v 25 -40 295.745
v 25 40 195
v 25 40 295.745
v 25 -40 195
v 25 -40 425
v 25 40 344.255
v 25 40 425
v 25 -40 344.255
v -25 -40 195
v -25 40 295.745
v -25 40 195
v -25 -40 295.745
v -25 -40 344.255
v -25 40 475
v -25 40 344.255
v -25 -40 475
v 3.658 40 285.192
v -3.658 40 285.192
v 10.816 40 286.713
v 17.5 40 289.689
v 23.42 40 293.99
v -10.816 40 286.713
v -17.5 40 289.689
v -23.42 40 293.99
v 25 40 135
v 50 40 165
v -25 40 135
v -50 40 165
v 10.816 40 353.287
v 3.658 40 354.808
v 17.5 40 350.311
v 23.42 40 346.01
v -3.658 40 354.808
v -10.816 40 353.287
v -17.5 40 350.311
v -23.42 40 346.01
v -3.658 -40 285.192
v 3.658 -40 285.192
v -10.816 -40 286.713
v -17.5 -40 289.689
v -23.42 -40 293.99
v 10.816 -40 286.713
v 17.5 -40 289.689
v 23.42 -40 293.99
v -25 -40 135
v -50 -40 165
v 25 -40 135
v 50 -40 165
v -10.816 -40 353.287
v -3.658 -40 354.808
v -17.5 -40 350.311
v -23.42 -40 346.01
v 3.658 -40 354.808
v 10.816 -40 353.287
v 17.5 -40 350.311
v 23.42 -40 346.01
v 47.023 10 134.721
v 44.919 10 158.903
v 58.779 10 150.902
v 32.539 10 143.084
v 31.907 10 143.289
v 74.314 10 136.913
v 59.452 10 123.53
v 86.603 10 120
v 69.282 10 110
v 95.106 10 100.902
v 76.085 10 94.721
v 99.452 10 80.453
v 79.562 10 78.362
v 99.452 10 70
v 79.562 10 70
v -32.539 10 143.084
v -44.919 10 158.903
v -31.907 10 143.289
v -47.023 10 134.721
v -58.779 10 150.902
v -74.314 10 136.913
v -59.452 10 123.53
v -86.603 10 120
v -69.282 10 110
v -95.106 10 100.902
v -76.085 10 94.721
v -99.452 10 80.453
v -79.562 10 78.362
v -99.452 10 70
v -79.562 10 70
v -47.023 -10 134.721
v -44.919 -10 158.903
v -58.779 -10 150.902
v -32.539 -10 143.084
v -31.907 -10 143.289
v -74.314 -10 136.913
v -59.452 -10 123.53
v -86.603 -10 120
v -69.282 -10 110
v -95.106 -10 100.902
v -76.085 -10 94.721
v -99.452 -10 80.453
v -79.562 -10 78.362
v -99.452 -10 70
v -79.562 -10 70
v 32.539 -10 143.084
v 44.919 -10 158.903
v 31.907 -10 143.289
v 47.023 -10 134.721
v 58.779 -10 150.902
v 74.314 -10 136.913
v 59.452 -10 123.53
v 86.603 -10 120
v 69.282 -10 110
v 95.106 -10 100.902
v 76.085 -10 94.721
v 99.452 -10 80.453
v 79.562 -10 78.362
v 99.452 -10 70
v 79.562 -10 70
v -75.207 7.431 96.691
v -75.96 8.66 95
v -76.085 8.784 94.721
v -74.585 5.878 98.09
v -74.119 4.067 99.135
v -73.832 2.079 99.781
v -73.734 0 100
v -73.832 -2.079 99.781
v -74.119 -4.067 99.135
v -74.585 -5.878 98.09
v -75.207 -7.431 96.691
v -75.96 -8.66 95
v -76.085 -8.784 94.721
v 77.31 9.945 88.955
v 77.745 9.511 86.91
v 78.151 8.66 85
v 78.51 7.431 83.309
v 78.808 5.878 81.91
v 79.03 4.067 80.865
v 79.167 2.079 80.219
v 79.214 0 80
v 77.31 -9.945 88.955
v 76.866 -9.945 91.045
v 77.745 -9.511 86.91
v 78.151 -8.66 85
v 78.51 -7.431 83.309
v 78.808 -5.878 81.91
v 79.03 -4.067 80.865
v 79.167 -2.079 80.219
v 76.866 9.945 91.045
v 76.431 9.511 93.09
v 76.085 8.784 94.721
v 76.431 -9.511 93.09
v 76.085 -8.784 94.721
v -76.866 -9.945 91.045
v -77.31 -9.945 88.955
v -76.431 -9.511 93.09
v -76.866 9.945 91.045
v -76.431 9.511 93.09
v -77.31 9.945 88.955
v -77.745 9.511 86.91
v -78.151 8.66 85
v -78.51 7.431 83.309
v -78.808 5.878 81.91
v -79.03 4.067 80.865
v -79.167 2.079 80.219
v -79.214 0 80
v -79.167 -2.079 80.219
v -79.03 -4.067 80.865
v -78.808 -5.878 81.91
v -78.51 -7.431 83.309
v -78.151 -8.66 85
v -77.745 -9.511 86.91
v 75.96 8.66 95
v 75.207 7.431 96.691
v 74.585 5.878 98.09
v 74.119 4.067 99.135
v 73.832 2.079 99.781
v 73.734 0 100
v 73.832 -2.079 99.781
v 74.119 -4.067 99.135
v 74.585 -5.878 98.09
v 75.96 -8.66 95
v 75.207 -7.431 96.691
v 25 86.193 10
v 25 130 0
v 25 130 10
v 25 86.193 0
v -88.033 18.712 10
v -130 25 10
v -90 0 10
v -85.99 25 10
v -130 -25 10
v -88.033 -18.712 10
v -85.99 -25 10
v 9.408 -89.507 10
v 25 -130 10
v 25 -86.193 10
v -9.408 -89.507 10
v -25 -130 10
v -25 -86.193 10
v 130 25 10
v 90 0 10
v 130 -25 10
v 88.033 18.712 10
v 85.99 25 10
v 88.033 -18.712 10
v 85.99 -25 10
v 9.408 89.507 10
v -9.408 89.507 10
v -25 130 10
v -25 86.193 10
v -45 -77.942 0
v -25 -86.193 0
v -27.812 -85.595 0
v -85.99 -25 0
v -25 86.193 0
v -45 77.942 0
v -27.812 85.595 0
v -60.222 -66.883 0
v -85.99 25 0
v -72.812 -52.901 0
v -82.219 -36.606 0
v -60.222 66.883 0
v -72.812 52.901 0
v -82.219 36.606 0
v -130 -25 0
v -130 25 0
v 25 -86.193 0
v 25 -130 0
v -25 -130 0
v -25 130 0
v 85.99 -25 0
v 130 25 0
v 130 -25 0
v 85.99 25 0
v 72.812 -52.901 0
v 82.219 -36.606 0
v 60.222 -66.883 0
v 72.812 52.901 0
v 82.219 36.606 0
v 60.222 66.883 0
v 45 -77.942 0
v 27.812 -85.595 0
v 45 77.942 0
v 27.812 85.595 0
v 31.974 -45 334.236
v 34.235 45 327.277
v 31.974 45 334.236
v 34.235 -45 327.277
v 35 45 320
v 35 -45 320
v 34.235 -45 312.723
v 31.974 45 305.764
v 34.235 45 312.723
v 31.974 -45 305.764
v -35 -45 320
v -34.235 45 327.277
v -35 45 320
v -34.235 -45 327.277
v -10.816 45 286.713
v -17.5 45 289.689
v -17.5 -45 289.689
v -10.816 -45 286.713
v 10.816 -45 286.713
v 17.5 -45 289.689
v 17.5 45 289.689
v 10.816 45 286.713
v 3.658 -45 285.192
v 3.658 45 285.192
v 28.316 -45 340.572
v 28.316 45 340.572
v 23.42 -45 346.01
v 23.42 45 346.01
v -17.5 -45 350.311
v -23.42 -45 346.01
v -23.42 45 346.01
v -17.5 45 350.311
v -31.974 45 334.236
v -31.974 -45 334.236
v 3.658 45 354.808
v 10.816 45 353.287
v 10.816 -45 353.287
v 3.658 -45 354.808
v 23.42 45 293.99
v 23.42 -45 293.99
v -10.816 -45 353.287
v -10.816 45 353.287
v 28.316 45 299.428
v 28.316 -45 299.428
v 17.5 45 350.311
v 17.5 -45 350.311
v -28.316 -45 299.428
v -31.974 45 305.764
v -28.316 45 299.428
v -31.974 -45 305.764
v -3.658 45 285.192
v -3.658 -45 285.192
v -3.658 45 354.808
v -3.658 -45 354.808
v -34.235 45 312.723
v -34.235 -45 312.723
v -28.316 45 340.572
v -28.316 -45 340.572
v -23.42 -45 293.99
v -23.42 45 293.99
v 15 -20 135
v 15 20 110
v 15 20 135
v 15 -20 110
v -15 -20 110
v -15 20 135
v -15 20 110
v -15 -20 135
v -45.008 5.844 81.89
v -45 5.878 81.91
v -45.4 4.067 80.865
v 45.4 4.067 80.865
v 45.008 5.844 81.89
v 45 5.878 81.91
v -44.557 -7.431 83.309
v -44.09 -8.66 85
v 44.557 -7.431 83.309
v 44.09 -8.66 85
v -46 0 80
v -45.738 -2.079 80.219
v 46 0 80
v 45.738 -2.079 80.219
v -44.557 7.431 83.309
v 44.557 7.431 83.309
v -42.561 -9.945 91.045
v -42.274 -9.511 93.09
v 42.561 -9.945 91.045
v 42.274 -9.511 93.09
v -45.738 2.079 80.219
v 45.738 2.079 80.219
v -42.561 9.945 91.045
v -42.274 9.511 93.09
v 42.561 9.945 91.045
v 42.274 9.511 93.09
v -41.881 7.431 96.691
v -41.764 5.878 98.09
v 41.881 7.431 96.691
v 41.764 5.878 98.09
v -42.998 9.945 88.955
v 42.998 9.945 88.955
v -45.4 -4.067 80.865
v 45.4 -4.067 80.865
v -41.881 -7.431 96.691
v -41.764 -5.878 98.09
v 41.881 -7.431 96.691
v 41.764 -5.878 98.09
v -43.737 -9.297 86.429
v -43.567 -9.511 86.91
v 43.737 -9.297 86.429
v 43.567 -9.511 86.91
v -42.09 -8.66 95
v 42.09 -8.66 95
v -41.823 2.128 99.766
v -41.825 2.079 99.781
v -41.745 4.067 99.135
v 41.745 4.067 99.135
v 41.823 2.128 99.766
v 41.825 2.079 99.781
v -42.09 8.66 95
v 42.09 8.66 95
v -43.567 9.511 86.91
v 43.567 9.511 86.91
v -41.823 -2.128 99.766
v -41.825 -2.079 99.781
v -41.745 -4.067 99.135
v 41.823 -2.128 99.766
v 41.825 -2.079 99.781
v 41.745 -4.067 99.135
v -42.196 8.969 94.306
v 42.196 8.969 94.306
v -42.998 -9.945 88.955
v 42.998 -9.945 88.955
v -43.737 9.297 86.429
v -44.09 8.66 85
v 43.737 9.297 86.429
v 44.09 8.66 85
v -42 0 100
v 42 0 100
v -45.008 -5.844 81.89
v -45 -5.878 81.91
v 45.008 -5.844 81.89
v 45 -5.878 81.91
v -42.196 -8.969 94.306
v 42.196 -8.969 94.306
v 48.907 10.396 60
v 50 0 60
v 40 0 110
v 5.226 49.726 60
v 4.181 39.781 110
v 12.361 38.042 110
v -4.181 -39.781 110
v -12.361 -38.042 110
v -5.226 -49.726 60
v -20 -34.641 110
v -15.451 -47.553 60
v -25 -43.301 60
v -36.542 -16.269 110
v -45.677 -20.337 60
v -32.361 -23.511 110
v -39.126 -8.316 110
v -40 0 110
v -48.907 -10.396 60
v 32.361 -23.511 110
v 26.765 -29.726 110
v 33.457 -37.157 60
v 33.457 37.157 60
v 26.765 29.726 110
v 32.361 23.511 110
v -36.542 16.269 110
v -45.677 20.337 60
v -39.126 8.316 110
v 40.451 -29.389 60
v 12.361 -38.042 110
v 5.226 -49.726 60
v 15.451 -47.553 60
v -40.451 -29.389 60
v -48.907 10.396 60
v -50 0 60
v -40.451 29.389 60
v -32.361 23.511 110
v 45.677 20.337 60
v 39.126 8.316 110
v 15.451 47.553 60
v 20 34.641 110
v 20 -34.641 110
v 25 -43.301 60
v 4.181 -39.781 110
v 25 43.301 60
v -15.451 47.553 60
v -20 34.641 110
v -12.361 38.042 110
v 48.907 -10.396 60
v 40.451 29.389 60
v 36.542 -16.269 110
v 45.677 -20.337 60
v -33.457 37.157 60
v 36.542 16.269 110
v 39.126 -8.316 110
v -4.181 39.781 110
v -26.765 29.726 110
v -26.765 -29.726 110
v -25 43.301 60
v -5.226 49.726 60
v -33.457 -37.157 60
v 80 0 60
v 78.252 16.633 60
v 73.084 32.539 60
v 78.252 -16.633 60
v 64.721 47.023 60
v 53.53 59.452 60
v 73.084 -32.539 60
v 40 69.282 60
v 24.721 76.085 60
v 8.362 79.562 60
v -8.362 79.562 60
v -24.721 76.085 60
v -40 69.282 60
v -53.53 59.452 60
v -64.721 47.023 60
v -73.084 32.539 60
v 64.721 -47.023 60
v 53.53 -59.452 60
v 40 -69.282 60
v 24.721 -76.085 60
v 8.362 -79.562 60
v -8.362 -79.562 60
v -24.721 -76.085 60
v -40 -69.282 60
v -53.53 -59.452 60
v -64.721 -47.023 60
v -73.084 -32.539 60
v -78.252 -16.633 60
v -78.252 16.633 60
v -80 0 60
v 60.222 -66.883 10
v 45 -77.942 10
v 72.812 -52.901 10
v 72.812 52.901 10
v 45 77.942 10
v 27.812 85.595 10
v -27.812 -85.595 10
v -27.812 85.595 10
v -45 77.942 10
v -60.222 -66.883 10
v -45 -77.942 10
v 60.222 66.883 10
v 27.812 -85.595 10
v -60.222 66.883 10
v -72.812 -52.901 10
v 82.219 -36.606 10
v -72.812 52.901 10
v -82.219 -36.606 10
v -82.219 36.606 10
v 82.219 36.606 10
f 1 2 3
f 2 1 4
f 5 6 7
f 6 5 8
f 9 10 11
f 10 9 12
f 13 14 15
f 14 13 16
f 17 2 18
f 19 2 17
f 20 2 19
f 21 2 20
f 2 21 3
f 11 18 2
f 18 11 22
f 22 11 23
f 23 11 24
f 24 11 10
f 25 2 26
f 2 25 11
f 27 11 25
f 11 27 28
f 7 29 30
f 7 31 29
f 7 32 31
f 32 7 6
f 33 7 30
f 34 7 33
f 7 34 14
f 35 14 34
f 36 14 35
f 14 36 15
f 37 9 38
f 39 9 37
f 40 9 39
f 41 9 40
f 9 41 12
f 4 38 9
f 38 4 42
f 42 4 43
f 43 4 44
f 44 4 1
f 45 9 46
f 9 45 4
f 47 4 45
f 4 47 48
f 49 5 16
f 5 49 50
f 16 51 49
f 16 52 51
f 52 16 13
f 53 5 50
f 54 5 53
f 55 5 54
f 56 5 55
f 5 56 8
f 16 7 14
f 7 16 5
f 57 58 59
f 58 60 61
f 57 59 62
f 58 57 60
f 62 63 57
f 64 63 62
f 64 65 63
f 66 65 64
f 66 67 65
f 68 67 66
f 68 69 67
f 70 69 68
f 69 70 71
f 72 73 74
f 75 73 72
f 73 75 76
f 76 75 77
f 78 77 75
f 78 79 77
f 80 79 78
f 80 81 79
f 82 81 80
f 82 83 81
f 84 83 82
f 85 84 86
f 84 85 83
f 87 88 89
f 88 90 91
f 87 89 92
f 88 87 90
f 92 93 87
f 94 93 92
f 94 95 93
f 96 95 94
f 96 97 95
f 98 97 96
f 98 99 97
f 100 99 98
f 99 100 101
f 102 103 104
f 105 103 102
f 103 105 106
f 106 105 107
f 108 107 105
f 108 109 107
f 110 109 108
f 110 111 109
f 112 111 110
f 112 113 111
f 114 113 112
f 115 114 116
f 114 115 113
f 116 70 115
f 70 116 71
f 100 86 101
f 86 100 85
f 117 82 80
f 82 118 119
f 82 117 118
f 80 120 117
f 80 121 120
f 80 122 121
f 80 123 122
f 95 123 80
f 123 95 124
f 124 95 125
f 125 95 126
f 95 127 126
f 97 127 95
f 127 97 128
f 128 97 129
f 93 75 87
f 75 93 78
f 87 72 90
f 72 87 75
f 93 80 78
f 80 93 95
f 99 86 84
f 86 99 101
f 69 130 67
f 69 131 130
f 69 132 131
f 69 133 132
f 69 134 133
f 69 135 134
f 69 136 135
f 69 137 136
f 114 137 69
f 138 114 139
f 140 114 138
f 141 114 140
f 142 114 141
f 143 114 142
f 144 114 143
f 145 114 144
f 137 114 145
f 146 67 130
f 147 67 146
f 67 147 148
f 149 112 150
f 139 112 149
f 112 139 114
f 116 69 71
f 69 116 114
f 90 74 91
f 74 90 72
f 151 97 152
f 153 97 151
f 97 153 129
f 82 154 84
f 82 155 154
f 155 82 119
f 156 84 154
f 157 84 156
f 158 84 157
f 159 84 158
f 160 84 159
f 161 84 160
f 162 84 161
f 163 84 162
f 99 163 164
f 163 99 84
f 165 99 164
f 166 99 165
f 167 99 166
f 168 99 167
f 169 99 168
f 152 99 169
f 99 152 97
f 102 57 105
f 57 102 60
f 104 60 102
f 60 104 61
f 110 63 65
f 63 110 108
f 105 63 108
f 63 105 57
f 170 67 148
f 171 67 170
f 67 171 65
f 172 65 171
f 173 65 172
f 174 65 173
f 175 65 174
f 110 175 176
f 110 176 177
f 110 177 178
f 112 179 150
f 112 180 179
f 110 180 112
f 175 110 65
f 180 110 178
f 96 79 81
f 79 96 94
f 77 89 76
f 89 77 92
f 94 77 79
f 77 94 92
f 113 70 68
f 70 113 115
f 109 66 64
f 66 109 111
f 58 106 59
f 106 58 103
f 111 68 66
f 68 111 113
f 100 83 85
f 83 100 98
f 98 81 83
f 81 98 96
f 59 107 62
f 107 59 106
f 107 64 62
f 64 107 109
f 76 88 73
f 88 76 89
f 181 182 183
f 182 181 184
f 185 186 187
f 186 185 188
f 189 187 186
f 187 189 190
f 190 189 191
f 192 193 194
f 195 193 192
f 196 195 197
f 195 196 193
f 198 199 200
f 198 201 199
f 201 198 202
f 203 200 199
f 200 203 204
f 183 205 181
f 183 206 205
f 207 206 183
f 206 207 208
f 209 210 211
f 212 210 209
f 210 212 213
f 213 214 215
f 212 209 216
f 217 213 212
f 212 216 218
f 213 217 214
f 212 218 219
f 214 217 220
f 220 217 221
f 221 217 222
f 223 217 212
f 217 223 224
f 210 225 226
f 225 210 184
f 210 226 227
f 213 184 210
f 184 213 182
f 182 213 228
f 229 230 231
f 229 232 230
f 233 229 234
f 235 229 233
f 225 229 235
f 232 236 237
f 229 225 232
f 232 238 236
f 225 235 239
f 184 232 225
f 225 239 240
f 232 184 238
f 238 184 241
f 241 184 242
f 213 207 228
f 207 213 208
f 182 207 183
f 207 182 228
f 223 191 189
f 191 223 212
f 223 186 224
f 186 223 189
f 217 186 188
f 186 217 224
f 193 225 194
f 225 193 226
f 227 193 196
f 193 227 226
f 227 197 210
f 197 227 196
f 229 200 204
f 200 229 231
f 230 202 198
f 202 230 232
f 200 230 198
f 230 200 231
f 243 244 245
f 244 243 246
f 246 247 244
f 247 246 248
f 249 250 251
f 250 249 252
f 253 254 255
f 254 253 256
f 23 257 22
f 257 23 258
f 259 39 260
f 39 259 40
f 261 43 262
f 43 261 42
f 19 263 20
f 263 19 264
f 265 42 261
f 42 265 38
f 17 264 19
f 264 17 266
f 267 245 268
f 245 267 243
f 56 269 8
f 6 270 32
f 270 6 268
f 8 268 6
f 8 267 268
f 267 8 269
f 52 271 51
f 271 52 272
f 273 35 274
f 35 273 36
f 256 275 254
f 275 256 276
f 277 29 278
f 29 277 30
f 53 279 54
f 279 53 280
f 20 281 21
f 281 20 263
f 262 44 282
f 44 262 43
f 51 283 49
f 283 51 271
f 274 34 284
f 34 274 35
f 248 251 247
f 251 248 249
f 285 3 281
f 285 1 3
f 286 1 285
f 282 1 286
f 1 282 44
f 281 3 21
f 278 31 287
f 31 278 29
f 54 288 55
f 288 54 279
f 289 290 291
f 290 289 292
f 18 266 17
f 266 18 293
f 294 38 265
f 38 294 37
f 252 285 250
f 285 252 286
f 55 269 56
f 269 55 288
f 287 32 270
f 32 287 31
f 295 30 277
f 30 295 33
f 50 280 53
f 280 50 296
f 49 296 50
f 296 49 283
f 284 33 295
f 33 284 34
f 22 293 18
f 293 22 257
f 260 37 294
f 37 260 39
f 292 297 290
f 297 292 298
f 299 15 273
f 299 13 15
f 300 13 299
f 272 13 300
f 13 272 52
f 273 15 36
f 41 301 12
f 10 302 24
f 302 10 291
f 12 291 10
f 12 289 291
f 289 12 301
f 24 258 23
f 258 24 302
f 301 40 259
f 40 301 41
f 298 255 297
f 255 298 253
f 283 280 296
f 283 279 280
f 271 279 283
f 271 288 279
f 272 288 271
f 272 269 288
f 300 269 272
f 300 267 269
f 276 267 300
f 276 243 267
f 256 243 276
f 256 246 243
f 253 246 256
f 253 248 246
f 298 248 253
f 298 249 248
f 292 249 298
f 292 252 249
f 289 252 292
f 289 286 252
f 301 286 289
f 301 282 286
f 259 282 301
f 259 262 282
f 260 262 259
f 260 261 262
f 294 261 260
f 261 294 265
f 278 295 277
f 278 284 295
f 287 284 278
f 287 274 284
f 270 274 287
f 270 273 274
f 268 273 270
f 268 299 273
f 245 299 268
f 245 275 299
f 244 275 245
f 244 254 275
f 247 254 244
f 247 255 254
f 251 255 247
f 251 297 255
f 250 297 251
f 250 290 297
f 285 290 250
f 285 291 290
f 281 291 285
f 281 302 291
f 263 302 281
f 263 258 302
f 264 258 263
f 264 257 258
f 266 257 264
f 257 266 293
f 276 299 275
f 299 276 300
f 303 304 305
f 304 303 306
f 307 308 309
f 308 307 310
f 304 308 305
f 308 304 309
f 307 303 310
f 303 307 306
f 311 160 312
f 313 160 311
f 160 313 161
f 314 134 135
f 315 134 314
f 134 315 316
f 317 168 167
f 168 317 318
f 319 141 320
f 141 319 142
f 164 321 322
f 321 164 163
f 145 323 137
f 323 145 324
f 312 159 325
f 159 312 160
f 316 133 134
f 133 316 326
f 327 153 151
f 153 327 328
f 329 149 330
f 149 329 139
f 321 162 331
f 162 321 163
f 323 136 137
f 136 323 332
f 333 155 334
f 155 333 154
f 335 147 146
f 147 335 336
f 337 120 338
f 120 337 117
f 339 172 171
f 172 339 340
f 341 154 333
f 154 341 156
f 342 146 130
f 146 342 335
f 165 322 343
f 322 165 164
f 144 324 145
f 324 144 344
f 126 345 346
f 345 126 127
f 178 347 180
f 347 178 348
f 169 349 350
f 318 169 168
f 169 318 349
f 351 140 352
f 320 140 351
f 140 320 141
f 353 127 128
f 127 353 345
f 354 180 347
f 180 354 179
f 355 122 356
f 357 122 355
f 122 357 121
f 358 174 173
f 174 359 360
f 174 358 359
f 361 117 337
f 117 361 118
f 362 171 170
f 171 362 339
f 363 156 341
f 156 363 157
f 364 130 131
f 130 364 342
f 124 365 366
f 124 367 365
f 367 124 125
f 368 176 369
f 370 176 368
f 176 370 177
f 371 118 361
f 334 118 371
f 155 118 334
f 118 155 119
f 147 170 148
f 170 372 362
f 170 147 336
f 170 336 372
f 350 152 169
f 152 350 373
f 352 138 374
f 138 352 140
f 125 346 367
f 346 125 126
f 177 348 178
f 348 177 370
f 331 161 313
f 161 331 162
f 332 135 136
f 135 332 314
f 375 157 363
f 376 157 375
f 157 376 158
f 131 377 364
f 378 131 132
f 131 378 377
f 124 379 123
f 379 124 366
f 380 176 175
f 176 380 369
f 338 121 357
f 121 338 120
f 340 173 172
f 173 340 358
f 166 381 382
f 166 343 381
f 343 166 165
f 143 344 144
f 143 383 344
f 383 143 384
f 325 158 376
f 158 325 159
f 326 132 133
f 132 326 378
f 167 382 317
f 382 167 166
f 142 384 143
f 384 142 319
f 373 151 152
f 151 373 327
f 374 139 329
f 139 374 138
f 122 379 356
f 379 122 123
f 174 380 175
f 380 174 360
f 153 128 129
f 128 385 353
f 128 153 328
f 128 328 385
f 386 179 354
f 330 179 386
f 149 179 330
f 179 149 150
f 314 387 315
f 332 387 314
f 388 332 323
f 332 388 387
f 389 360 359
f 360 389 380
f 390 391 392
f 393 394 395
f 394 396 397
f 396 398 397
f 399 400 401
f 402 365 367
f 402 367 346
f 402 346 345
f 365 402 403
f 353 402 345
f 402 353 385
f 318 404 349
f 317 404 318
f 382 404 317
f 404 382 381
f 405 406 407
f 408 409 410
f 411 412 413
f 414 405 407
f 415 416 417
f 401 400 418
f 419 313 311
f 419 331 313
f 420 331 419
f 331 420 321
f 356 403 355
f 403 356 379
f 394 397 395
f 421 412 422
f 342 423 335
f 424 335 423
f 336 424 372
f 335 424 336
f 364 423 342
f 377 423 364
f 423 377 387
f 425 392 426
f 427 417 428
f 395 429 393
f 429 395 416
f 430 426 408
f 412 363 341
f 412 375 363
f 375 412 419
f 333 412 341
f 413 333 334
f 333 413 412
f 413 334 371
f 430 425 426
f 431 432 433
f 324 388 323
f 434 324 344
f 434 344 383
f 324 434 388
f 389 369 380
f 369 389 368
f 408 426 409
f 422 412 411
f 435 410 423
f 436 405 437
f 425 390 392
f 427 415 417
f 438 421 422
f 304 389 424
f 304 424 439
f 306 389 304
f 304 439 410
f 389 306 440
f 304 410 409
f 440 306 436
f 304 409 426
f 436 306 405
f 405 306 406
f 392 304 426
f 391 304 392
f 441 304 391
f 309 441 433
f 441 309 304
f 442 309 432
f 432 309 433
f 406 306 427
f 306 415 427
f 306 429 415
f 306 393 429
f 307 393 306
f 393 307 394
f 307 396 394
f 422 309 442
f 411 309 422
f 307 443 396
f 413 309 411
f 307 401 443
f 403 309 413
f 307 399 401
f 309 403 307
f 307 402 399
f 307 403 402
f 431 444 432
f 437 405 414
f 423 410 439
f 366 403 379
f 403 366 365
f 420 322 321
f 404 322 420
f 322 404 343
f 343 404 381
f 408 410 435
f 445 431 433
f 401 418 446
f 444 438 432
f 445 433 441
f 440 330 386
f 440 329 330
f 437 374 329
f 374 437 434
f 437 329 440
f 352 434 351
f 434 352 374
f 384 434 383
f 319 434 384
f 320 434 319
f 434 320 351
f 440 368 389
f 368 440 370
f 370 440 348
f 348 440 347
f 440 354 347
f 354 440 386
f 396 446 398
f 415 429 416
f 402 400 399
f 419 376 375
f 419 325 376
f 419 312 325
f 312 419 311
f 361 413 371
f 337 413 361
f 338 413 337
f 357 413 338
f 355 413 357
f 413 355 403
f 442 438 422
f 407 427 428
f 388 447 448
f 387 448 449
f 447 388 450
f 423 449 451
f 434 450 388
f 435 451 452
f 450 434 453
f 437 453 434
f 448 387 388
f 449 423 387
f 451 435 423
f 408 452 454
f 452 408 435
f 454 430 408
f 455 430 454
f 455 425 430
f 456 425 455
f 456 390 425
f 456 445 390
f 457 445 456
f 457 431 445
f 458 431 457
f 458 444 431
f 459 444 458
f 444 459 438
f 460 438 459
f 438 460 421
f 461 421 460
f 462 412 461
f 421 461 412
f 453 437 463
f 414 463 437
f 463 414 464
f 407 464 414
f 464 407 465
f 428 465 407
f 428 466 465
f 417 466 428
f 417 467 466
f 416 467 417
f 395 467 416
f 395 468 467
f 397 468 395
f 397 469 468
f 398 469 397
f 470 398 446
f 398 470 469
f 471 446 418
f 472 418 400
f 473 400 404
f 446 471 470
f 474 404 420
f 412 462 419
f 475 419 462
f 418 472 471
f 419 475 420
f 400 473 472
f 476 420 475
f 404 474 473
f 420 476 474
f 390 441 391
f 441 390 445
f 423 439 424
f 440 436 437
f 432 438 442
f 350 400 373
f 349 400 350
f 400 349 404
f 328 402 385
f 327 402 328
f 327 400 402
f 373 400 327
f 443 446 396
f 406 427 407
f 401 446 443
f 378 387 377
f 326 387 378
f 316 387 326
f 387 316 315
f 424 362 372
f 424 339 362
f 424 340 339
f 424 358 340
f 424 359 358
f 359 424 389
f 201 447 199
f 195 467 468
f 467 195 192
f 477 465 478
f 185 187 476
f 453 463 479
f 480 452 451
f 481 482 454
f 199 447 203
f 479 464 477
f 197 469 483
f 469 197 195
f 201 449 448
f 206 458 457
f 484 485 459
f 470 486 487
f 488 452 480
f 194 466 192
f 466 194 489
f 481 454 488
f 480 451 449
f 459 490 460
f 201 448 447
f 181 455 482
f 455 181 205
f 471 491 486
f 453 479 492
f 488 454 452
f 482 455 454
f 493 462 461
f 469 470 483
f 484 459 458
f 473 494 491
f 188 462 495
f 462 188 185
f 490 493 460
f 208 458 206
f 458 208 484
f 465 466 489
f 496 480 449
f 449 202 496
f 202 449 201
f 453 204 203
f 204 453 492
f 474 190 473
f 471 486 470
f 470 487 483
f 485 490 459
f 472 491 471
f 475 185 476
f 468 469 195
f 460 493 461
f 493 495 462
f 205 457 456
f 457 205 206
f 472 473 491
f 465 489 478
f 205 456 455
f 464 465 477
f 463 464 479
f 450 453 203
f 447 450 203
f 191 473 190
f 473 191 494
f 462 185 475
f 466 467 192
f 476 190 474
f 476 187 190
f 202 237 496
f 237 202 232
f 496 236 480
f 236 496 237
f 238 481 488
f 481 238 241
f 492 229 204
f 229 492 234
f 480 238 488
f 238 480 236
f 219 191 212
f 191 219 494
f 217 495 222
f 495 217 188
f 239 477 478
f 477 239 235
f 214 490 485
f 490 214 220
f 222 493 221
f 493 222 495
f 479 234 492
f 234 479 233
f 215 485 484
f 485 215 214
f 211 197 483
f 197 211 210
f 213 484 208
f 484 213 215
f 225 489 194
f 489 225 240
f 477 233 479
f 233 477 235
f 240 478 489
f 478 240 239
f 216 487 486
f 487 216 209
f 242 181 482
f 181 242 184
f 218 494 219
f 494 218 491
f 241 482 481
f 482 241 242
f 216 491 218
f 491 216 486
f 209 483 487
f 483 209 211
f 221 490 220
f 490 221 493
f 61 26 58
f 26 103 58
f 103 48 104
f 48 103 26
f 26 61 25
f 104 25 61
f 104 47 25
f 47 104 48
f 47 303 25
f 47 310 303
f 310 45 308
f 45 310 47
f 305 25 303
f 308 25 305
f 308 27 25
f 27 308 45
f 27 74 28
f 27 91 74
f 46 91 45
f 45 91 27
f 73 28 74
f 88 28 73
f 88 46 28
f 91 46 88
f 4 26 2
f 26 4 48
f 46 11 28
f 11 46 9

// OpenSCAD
translate([0,45,320])
rotate([90,0,0])
cylinder(90,35,35);

translate([-15,-20,0])
cube([30,40,300],false);

translate([-90,0,90])
rotate([0,90,0])
cylinder(180,10,10);

group(){
    difference(){
        translate([-25,-40,195])
        cube([50,80,300],false);
    
        translate([-40,-40,490])
        rotate([0,45,0])
        cube([100,160,50],false);    
    }
}


translate([0,-10,0])
rotate([0,0,90])
group(){
    rotate([0,90,0])
    translate([-70,0,0])
    difference(){
        cylinder(20,100,100);
        group(){
            translate([0,-100,0])
            cube([100,200,20],false);
            cylinder(20,80,80);
        }
    
    }
}
translate([0,0,60])
cylinder(50,50,40);

translate([0,0,10])
cylinder(50,90,80);

cylinder(10,90,90);

for(k =  [0 : 1 : 3]){
    rotate([0,0,90*k])
    translate([-25,80,0])    
    cube([50,50,10],false);
}
B = 100; //-- Base larga
b = 50; //-- Base corta
h = 60; //-- Altura
translate([0,0,150])
rotate([90, 180, 0]) 
linear_extrude(height = 80, center = true) 
polygon(points = [
                  [-B/2, -h/2],
                  [-b/2, h/2],
                  [b/2, h/2],
                  [B/2, -h/2]
                 ]);

B = 100; //-- Base larga
b = 50; //-- Base corta
h = 30; //-- Altura
translate([0,0,180])
rotate([90, 0, 0]) 
linear_extrude(height = 80, center = true) 
polygon(points = [
                  [-B/2, -h/2],
                  [-b/2, h/2],
                  [b/2, h/2],
                  [B/2, -h/2]
                 ]);
